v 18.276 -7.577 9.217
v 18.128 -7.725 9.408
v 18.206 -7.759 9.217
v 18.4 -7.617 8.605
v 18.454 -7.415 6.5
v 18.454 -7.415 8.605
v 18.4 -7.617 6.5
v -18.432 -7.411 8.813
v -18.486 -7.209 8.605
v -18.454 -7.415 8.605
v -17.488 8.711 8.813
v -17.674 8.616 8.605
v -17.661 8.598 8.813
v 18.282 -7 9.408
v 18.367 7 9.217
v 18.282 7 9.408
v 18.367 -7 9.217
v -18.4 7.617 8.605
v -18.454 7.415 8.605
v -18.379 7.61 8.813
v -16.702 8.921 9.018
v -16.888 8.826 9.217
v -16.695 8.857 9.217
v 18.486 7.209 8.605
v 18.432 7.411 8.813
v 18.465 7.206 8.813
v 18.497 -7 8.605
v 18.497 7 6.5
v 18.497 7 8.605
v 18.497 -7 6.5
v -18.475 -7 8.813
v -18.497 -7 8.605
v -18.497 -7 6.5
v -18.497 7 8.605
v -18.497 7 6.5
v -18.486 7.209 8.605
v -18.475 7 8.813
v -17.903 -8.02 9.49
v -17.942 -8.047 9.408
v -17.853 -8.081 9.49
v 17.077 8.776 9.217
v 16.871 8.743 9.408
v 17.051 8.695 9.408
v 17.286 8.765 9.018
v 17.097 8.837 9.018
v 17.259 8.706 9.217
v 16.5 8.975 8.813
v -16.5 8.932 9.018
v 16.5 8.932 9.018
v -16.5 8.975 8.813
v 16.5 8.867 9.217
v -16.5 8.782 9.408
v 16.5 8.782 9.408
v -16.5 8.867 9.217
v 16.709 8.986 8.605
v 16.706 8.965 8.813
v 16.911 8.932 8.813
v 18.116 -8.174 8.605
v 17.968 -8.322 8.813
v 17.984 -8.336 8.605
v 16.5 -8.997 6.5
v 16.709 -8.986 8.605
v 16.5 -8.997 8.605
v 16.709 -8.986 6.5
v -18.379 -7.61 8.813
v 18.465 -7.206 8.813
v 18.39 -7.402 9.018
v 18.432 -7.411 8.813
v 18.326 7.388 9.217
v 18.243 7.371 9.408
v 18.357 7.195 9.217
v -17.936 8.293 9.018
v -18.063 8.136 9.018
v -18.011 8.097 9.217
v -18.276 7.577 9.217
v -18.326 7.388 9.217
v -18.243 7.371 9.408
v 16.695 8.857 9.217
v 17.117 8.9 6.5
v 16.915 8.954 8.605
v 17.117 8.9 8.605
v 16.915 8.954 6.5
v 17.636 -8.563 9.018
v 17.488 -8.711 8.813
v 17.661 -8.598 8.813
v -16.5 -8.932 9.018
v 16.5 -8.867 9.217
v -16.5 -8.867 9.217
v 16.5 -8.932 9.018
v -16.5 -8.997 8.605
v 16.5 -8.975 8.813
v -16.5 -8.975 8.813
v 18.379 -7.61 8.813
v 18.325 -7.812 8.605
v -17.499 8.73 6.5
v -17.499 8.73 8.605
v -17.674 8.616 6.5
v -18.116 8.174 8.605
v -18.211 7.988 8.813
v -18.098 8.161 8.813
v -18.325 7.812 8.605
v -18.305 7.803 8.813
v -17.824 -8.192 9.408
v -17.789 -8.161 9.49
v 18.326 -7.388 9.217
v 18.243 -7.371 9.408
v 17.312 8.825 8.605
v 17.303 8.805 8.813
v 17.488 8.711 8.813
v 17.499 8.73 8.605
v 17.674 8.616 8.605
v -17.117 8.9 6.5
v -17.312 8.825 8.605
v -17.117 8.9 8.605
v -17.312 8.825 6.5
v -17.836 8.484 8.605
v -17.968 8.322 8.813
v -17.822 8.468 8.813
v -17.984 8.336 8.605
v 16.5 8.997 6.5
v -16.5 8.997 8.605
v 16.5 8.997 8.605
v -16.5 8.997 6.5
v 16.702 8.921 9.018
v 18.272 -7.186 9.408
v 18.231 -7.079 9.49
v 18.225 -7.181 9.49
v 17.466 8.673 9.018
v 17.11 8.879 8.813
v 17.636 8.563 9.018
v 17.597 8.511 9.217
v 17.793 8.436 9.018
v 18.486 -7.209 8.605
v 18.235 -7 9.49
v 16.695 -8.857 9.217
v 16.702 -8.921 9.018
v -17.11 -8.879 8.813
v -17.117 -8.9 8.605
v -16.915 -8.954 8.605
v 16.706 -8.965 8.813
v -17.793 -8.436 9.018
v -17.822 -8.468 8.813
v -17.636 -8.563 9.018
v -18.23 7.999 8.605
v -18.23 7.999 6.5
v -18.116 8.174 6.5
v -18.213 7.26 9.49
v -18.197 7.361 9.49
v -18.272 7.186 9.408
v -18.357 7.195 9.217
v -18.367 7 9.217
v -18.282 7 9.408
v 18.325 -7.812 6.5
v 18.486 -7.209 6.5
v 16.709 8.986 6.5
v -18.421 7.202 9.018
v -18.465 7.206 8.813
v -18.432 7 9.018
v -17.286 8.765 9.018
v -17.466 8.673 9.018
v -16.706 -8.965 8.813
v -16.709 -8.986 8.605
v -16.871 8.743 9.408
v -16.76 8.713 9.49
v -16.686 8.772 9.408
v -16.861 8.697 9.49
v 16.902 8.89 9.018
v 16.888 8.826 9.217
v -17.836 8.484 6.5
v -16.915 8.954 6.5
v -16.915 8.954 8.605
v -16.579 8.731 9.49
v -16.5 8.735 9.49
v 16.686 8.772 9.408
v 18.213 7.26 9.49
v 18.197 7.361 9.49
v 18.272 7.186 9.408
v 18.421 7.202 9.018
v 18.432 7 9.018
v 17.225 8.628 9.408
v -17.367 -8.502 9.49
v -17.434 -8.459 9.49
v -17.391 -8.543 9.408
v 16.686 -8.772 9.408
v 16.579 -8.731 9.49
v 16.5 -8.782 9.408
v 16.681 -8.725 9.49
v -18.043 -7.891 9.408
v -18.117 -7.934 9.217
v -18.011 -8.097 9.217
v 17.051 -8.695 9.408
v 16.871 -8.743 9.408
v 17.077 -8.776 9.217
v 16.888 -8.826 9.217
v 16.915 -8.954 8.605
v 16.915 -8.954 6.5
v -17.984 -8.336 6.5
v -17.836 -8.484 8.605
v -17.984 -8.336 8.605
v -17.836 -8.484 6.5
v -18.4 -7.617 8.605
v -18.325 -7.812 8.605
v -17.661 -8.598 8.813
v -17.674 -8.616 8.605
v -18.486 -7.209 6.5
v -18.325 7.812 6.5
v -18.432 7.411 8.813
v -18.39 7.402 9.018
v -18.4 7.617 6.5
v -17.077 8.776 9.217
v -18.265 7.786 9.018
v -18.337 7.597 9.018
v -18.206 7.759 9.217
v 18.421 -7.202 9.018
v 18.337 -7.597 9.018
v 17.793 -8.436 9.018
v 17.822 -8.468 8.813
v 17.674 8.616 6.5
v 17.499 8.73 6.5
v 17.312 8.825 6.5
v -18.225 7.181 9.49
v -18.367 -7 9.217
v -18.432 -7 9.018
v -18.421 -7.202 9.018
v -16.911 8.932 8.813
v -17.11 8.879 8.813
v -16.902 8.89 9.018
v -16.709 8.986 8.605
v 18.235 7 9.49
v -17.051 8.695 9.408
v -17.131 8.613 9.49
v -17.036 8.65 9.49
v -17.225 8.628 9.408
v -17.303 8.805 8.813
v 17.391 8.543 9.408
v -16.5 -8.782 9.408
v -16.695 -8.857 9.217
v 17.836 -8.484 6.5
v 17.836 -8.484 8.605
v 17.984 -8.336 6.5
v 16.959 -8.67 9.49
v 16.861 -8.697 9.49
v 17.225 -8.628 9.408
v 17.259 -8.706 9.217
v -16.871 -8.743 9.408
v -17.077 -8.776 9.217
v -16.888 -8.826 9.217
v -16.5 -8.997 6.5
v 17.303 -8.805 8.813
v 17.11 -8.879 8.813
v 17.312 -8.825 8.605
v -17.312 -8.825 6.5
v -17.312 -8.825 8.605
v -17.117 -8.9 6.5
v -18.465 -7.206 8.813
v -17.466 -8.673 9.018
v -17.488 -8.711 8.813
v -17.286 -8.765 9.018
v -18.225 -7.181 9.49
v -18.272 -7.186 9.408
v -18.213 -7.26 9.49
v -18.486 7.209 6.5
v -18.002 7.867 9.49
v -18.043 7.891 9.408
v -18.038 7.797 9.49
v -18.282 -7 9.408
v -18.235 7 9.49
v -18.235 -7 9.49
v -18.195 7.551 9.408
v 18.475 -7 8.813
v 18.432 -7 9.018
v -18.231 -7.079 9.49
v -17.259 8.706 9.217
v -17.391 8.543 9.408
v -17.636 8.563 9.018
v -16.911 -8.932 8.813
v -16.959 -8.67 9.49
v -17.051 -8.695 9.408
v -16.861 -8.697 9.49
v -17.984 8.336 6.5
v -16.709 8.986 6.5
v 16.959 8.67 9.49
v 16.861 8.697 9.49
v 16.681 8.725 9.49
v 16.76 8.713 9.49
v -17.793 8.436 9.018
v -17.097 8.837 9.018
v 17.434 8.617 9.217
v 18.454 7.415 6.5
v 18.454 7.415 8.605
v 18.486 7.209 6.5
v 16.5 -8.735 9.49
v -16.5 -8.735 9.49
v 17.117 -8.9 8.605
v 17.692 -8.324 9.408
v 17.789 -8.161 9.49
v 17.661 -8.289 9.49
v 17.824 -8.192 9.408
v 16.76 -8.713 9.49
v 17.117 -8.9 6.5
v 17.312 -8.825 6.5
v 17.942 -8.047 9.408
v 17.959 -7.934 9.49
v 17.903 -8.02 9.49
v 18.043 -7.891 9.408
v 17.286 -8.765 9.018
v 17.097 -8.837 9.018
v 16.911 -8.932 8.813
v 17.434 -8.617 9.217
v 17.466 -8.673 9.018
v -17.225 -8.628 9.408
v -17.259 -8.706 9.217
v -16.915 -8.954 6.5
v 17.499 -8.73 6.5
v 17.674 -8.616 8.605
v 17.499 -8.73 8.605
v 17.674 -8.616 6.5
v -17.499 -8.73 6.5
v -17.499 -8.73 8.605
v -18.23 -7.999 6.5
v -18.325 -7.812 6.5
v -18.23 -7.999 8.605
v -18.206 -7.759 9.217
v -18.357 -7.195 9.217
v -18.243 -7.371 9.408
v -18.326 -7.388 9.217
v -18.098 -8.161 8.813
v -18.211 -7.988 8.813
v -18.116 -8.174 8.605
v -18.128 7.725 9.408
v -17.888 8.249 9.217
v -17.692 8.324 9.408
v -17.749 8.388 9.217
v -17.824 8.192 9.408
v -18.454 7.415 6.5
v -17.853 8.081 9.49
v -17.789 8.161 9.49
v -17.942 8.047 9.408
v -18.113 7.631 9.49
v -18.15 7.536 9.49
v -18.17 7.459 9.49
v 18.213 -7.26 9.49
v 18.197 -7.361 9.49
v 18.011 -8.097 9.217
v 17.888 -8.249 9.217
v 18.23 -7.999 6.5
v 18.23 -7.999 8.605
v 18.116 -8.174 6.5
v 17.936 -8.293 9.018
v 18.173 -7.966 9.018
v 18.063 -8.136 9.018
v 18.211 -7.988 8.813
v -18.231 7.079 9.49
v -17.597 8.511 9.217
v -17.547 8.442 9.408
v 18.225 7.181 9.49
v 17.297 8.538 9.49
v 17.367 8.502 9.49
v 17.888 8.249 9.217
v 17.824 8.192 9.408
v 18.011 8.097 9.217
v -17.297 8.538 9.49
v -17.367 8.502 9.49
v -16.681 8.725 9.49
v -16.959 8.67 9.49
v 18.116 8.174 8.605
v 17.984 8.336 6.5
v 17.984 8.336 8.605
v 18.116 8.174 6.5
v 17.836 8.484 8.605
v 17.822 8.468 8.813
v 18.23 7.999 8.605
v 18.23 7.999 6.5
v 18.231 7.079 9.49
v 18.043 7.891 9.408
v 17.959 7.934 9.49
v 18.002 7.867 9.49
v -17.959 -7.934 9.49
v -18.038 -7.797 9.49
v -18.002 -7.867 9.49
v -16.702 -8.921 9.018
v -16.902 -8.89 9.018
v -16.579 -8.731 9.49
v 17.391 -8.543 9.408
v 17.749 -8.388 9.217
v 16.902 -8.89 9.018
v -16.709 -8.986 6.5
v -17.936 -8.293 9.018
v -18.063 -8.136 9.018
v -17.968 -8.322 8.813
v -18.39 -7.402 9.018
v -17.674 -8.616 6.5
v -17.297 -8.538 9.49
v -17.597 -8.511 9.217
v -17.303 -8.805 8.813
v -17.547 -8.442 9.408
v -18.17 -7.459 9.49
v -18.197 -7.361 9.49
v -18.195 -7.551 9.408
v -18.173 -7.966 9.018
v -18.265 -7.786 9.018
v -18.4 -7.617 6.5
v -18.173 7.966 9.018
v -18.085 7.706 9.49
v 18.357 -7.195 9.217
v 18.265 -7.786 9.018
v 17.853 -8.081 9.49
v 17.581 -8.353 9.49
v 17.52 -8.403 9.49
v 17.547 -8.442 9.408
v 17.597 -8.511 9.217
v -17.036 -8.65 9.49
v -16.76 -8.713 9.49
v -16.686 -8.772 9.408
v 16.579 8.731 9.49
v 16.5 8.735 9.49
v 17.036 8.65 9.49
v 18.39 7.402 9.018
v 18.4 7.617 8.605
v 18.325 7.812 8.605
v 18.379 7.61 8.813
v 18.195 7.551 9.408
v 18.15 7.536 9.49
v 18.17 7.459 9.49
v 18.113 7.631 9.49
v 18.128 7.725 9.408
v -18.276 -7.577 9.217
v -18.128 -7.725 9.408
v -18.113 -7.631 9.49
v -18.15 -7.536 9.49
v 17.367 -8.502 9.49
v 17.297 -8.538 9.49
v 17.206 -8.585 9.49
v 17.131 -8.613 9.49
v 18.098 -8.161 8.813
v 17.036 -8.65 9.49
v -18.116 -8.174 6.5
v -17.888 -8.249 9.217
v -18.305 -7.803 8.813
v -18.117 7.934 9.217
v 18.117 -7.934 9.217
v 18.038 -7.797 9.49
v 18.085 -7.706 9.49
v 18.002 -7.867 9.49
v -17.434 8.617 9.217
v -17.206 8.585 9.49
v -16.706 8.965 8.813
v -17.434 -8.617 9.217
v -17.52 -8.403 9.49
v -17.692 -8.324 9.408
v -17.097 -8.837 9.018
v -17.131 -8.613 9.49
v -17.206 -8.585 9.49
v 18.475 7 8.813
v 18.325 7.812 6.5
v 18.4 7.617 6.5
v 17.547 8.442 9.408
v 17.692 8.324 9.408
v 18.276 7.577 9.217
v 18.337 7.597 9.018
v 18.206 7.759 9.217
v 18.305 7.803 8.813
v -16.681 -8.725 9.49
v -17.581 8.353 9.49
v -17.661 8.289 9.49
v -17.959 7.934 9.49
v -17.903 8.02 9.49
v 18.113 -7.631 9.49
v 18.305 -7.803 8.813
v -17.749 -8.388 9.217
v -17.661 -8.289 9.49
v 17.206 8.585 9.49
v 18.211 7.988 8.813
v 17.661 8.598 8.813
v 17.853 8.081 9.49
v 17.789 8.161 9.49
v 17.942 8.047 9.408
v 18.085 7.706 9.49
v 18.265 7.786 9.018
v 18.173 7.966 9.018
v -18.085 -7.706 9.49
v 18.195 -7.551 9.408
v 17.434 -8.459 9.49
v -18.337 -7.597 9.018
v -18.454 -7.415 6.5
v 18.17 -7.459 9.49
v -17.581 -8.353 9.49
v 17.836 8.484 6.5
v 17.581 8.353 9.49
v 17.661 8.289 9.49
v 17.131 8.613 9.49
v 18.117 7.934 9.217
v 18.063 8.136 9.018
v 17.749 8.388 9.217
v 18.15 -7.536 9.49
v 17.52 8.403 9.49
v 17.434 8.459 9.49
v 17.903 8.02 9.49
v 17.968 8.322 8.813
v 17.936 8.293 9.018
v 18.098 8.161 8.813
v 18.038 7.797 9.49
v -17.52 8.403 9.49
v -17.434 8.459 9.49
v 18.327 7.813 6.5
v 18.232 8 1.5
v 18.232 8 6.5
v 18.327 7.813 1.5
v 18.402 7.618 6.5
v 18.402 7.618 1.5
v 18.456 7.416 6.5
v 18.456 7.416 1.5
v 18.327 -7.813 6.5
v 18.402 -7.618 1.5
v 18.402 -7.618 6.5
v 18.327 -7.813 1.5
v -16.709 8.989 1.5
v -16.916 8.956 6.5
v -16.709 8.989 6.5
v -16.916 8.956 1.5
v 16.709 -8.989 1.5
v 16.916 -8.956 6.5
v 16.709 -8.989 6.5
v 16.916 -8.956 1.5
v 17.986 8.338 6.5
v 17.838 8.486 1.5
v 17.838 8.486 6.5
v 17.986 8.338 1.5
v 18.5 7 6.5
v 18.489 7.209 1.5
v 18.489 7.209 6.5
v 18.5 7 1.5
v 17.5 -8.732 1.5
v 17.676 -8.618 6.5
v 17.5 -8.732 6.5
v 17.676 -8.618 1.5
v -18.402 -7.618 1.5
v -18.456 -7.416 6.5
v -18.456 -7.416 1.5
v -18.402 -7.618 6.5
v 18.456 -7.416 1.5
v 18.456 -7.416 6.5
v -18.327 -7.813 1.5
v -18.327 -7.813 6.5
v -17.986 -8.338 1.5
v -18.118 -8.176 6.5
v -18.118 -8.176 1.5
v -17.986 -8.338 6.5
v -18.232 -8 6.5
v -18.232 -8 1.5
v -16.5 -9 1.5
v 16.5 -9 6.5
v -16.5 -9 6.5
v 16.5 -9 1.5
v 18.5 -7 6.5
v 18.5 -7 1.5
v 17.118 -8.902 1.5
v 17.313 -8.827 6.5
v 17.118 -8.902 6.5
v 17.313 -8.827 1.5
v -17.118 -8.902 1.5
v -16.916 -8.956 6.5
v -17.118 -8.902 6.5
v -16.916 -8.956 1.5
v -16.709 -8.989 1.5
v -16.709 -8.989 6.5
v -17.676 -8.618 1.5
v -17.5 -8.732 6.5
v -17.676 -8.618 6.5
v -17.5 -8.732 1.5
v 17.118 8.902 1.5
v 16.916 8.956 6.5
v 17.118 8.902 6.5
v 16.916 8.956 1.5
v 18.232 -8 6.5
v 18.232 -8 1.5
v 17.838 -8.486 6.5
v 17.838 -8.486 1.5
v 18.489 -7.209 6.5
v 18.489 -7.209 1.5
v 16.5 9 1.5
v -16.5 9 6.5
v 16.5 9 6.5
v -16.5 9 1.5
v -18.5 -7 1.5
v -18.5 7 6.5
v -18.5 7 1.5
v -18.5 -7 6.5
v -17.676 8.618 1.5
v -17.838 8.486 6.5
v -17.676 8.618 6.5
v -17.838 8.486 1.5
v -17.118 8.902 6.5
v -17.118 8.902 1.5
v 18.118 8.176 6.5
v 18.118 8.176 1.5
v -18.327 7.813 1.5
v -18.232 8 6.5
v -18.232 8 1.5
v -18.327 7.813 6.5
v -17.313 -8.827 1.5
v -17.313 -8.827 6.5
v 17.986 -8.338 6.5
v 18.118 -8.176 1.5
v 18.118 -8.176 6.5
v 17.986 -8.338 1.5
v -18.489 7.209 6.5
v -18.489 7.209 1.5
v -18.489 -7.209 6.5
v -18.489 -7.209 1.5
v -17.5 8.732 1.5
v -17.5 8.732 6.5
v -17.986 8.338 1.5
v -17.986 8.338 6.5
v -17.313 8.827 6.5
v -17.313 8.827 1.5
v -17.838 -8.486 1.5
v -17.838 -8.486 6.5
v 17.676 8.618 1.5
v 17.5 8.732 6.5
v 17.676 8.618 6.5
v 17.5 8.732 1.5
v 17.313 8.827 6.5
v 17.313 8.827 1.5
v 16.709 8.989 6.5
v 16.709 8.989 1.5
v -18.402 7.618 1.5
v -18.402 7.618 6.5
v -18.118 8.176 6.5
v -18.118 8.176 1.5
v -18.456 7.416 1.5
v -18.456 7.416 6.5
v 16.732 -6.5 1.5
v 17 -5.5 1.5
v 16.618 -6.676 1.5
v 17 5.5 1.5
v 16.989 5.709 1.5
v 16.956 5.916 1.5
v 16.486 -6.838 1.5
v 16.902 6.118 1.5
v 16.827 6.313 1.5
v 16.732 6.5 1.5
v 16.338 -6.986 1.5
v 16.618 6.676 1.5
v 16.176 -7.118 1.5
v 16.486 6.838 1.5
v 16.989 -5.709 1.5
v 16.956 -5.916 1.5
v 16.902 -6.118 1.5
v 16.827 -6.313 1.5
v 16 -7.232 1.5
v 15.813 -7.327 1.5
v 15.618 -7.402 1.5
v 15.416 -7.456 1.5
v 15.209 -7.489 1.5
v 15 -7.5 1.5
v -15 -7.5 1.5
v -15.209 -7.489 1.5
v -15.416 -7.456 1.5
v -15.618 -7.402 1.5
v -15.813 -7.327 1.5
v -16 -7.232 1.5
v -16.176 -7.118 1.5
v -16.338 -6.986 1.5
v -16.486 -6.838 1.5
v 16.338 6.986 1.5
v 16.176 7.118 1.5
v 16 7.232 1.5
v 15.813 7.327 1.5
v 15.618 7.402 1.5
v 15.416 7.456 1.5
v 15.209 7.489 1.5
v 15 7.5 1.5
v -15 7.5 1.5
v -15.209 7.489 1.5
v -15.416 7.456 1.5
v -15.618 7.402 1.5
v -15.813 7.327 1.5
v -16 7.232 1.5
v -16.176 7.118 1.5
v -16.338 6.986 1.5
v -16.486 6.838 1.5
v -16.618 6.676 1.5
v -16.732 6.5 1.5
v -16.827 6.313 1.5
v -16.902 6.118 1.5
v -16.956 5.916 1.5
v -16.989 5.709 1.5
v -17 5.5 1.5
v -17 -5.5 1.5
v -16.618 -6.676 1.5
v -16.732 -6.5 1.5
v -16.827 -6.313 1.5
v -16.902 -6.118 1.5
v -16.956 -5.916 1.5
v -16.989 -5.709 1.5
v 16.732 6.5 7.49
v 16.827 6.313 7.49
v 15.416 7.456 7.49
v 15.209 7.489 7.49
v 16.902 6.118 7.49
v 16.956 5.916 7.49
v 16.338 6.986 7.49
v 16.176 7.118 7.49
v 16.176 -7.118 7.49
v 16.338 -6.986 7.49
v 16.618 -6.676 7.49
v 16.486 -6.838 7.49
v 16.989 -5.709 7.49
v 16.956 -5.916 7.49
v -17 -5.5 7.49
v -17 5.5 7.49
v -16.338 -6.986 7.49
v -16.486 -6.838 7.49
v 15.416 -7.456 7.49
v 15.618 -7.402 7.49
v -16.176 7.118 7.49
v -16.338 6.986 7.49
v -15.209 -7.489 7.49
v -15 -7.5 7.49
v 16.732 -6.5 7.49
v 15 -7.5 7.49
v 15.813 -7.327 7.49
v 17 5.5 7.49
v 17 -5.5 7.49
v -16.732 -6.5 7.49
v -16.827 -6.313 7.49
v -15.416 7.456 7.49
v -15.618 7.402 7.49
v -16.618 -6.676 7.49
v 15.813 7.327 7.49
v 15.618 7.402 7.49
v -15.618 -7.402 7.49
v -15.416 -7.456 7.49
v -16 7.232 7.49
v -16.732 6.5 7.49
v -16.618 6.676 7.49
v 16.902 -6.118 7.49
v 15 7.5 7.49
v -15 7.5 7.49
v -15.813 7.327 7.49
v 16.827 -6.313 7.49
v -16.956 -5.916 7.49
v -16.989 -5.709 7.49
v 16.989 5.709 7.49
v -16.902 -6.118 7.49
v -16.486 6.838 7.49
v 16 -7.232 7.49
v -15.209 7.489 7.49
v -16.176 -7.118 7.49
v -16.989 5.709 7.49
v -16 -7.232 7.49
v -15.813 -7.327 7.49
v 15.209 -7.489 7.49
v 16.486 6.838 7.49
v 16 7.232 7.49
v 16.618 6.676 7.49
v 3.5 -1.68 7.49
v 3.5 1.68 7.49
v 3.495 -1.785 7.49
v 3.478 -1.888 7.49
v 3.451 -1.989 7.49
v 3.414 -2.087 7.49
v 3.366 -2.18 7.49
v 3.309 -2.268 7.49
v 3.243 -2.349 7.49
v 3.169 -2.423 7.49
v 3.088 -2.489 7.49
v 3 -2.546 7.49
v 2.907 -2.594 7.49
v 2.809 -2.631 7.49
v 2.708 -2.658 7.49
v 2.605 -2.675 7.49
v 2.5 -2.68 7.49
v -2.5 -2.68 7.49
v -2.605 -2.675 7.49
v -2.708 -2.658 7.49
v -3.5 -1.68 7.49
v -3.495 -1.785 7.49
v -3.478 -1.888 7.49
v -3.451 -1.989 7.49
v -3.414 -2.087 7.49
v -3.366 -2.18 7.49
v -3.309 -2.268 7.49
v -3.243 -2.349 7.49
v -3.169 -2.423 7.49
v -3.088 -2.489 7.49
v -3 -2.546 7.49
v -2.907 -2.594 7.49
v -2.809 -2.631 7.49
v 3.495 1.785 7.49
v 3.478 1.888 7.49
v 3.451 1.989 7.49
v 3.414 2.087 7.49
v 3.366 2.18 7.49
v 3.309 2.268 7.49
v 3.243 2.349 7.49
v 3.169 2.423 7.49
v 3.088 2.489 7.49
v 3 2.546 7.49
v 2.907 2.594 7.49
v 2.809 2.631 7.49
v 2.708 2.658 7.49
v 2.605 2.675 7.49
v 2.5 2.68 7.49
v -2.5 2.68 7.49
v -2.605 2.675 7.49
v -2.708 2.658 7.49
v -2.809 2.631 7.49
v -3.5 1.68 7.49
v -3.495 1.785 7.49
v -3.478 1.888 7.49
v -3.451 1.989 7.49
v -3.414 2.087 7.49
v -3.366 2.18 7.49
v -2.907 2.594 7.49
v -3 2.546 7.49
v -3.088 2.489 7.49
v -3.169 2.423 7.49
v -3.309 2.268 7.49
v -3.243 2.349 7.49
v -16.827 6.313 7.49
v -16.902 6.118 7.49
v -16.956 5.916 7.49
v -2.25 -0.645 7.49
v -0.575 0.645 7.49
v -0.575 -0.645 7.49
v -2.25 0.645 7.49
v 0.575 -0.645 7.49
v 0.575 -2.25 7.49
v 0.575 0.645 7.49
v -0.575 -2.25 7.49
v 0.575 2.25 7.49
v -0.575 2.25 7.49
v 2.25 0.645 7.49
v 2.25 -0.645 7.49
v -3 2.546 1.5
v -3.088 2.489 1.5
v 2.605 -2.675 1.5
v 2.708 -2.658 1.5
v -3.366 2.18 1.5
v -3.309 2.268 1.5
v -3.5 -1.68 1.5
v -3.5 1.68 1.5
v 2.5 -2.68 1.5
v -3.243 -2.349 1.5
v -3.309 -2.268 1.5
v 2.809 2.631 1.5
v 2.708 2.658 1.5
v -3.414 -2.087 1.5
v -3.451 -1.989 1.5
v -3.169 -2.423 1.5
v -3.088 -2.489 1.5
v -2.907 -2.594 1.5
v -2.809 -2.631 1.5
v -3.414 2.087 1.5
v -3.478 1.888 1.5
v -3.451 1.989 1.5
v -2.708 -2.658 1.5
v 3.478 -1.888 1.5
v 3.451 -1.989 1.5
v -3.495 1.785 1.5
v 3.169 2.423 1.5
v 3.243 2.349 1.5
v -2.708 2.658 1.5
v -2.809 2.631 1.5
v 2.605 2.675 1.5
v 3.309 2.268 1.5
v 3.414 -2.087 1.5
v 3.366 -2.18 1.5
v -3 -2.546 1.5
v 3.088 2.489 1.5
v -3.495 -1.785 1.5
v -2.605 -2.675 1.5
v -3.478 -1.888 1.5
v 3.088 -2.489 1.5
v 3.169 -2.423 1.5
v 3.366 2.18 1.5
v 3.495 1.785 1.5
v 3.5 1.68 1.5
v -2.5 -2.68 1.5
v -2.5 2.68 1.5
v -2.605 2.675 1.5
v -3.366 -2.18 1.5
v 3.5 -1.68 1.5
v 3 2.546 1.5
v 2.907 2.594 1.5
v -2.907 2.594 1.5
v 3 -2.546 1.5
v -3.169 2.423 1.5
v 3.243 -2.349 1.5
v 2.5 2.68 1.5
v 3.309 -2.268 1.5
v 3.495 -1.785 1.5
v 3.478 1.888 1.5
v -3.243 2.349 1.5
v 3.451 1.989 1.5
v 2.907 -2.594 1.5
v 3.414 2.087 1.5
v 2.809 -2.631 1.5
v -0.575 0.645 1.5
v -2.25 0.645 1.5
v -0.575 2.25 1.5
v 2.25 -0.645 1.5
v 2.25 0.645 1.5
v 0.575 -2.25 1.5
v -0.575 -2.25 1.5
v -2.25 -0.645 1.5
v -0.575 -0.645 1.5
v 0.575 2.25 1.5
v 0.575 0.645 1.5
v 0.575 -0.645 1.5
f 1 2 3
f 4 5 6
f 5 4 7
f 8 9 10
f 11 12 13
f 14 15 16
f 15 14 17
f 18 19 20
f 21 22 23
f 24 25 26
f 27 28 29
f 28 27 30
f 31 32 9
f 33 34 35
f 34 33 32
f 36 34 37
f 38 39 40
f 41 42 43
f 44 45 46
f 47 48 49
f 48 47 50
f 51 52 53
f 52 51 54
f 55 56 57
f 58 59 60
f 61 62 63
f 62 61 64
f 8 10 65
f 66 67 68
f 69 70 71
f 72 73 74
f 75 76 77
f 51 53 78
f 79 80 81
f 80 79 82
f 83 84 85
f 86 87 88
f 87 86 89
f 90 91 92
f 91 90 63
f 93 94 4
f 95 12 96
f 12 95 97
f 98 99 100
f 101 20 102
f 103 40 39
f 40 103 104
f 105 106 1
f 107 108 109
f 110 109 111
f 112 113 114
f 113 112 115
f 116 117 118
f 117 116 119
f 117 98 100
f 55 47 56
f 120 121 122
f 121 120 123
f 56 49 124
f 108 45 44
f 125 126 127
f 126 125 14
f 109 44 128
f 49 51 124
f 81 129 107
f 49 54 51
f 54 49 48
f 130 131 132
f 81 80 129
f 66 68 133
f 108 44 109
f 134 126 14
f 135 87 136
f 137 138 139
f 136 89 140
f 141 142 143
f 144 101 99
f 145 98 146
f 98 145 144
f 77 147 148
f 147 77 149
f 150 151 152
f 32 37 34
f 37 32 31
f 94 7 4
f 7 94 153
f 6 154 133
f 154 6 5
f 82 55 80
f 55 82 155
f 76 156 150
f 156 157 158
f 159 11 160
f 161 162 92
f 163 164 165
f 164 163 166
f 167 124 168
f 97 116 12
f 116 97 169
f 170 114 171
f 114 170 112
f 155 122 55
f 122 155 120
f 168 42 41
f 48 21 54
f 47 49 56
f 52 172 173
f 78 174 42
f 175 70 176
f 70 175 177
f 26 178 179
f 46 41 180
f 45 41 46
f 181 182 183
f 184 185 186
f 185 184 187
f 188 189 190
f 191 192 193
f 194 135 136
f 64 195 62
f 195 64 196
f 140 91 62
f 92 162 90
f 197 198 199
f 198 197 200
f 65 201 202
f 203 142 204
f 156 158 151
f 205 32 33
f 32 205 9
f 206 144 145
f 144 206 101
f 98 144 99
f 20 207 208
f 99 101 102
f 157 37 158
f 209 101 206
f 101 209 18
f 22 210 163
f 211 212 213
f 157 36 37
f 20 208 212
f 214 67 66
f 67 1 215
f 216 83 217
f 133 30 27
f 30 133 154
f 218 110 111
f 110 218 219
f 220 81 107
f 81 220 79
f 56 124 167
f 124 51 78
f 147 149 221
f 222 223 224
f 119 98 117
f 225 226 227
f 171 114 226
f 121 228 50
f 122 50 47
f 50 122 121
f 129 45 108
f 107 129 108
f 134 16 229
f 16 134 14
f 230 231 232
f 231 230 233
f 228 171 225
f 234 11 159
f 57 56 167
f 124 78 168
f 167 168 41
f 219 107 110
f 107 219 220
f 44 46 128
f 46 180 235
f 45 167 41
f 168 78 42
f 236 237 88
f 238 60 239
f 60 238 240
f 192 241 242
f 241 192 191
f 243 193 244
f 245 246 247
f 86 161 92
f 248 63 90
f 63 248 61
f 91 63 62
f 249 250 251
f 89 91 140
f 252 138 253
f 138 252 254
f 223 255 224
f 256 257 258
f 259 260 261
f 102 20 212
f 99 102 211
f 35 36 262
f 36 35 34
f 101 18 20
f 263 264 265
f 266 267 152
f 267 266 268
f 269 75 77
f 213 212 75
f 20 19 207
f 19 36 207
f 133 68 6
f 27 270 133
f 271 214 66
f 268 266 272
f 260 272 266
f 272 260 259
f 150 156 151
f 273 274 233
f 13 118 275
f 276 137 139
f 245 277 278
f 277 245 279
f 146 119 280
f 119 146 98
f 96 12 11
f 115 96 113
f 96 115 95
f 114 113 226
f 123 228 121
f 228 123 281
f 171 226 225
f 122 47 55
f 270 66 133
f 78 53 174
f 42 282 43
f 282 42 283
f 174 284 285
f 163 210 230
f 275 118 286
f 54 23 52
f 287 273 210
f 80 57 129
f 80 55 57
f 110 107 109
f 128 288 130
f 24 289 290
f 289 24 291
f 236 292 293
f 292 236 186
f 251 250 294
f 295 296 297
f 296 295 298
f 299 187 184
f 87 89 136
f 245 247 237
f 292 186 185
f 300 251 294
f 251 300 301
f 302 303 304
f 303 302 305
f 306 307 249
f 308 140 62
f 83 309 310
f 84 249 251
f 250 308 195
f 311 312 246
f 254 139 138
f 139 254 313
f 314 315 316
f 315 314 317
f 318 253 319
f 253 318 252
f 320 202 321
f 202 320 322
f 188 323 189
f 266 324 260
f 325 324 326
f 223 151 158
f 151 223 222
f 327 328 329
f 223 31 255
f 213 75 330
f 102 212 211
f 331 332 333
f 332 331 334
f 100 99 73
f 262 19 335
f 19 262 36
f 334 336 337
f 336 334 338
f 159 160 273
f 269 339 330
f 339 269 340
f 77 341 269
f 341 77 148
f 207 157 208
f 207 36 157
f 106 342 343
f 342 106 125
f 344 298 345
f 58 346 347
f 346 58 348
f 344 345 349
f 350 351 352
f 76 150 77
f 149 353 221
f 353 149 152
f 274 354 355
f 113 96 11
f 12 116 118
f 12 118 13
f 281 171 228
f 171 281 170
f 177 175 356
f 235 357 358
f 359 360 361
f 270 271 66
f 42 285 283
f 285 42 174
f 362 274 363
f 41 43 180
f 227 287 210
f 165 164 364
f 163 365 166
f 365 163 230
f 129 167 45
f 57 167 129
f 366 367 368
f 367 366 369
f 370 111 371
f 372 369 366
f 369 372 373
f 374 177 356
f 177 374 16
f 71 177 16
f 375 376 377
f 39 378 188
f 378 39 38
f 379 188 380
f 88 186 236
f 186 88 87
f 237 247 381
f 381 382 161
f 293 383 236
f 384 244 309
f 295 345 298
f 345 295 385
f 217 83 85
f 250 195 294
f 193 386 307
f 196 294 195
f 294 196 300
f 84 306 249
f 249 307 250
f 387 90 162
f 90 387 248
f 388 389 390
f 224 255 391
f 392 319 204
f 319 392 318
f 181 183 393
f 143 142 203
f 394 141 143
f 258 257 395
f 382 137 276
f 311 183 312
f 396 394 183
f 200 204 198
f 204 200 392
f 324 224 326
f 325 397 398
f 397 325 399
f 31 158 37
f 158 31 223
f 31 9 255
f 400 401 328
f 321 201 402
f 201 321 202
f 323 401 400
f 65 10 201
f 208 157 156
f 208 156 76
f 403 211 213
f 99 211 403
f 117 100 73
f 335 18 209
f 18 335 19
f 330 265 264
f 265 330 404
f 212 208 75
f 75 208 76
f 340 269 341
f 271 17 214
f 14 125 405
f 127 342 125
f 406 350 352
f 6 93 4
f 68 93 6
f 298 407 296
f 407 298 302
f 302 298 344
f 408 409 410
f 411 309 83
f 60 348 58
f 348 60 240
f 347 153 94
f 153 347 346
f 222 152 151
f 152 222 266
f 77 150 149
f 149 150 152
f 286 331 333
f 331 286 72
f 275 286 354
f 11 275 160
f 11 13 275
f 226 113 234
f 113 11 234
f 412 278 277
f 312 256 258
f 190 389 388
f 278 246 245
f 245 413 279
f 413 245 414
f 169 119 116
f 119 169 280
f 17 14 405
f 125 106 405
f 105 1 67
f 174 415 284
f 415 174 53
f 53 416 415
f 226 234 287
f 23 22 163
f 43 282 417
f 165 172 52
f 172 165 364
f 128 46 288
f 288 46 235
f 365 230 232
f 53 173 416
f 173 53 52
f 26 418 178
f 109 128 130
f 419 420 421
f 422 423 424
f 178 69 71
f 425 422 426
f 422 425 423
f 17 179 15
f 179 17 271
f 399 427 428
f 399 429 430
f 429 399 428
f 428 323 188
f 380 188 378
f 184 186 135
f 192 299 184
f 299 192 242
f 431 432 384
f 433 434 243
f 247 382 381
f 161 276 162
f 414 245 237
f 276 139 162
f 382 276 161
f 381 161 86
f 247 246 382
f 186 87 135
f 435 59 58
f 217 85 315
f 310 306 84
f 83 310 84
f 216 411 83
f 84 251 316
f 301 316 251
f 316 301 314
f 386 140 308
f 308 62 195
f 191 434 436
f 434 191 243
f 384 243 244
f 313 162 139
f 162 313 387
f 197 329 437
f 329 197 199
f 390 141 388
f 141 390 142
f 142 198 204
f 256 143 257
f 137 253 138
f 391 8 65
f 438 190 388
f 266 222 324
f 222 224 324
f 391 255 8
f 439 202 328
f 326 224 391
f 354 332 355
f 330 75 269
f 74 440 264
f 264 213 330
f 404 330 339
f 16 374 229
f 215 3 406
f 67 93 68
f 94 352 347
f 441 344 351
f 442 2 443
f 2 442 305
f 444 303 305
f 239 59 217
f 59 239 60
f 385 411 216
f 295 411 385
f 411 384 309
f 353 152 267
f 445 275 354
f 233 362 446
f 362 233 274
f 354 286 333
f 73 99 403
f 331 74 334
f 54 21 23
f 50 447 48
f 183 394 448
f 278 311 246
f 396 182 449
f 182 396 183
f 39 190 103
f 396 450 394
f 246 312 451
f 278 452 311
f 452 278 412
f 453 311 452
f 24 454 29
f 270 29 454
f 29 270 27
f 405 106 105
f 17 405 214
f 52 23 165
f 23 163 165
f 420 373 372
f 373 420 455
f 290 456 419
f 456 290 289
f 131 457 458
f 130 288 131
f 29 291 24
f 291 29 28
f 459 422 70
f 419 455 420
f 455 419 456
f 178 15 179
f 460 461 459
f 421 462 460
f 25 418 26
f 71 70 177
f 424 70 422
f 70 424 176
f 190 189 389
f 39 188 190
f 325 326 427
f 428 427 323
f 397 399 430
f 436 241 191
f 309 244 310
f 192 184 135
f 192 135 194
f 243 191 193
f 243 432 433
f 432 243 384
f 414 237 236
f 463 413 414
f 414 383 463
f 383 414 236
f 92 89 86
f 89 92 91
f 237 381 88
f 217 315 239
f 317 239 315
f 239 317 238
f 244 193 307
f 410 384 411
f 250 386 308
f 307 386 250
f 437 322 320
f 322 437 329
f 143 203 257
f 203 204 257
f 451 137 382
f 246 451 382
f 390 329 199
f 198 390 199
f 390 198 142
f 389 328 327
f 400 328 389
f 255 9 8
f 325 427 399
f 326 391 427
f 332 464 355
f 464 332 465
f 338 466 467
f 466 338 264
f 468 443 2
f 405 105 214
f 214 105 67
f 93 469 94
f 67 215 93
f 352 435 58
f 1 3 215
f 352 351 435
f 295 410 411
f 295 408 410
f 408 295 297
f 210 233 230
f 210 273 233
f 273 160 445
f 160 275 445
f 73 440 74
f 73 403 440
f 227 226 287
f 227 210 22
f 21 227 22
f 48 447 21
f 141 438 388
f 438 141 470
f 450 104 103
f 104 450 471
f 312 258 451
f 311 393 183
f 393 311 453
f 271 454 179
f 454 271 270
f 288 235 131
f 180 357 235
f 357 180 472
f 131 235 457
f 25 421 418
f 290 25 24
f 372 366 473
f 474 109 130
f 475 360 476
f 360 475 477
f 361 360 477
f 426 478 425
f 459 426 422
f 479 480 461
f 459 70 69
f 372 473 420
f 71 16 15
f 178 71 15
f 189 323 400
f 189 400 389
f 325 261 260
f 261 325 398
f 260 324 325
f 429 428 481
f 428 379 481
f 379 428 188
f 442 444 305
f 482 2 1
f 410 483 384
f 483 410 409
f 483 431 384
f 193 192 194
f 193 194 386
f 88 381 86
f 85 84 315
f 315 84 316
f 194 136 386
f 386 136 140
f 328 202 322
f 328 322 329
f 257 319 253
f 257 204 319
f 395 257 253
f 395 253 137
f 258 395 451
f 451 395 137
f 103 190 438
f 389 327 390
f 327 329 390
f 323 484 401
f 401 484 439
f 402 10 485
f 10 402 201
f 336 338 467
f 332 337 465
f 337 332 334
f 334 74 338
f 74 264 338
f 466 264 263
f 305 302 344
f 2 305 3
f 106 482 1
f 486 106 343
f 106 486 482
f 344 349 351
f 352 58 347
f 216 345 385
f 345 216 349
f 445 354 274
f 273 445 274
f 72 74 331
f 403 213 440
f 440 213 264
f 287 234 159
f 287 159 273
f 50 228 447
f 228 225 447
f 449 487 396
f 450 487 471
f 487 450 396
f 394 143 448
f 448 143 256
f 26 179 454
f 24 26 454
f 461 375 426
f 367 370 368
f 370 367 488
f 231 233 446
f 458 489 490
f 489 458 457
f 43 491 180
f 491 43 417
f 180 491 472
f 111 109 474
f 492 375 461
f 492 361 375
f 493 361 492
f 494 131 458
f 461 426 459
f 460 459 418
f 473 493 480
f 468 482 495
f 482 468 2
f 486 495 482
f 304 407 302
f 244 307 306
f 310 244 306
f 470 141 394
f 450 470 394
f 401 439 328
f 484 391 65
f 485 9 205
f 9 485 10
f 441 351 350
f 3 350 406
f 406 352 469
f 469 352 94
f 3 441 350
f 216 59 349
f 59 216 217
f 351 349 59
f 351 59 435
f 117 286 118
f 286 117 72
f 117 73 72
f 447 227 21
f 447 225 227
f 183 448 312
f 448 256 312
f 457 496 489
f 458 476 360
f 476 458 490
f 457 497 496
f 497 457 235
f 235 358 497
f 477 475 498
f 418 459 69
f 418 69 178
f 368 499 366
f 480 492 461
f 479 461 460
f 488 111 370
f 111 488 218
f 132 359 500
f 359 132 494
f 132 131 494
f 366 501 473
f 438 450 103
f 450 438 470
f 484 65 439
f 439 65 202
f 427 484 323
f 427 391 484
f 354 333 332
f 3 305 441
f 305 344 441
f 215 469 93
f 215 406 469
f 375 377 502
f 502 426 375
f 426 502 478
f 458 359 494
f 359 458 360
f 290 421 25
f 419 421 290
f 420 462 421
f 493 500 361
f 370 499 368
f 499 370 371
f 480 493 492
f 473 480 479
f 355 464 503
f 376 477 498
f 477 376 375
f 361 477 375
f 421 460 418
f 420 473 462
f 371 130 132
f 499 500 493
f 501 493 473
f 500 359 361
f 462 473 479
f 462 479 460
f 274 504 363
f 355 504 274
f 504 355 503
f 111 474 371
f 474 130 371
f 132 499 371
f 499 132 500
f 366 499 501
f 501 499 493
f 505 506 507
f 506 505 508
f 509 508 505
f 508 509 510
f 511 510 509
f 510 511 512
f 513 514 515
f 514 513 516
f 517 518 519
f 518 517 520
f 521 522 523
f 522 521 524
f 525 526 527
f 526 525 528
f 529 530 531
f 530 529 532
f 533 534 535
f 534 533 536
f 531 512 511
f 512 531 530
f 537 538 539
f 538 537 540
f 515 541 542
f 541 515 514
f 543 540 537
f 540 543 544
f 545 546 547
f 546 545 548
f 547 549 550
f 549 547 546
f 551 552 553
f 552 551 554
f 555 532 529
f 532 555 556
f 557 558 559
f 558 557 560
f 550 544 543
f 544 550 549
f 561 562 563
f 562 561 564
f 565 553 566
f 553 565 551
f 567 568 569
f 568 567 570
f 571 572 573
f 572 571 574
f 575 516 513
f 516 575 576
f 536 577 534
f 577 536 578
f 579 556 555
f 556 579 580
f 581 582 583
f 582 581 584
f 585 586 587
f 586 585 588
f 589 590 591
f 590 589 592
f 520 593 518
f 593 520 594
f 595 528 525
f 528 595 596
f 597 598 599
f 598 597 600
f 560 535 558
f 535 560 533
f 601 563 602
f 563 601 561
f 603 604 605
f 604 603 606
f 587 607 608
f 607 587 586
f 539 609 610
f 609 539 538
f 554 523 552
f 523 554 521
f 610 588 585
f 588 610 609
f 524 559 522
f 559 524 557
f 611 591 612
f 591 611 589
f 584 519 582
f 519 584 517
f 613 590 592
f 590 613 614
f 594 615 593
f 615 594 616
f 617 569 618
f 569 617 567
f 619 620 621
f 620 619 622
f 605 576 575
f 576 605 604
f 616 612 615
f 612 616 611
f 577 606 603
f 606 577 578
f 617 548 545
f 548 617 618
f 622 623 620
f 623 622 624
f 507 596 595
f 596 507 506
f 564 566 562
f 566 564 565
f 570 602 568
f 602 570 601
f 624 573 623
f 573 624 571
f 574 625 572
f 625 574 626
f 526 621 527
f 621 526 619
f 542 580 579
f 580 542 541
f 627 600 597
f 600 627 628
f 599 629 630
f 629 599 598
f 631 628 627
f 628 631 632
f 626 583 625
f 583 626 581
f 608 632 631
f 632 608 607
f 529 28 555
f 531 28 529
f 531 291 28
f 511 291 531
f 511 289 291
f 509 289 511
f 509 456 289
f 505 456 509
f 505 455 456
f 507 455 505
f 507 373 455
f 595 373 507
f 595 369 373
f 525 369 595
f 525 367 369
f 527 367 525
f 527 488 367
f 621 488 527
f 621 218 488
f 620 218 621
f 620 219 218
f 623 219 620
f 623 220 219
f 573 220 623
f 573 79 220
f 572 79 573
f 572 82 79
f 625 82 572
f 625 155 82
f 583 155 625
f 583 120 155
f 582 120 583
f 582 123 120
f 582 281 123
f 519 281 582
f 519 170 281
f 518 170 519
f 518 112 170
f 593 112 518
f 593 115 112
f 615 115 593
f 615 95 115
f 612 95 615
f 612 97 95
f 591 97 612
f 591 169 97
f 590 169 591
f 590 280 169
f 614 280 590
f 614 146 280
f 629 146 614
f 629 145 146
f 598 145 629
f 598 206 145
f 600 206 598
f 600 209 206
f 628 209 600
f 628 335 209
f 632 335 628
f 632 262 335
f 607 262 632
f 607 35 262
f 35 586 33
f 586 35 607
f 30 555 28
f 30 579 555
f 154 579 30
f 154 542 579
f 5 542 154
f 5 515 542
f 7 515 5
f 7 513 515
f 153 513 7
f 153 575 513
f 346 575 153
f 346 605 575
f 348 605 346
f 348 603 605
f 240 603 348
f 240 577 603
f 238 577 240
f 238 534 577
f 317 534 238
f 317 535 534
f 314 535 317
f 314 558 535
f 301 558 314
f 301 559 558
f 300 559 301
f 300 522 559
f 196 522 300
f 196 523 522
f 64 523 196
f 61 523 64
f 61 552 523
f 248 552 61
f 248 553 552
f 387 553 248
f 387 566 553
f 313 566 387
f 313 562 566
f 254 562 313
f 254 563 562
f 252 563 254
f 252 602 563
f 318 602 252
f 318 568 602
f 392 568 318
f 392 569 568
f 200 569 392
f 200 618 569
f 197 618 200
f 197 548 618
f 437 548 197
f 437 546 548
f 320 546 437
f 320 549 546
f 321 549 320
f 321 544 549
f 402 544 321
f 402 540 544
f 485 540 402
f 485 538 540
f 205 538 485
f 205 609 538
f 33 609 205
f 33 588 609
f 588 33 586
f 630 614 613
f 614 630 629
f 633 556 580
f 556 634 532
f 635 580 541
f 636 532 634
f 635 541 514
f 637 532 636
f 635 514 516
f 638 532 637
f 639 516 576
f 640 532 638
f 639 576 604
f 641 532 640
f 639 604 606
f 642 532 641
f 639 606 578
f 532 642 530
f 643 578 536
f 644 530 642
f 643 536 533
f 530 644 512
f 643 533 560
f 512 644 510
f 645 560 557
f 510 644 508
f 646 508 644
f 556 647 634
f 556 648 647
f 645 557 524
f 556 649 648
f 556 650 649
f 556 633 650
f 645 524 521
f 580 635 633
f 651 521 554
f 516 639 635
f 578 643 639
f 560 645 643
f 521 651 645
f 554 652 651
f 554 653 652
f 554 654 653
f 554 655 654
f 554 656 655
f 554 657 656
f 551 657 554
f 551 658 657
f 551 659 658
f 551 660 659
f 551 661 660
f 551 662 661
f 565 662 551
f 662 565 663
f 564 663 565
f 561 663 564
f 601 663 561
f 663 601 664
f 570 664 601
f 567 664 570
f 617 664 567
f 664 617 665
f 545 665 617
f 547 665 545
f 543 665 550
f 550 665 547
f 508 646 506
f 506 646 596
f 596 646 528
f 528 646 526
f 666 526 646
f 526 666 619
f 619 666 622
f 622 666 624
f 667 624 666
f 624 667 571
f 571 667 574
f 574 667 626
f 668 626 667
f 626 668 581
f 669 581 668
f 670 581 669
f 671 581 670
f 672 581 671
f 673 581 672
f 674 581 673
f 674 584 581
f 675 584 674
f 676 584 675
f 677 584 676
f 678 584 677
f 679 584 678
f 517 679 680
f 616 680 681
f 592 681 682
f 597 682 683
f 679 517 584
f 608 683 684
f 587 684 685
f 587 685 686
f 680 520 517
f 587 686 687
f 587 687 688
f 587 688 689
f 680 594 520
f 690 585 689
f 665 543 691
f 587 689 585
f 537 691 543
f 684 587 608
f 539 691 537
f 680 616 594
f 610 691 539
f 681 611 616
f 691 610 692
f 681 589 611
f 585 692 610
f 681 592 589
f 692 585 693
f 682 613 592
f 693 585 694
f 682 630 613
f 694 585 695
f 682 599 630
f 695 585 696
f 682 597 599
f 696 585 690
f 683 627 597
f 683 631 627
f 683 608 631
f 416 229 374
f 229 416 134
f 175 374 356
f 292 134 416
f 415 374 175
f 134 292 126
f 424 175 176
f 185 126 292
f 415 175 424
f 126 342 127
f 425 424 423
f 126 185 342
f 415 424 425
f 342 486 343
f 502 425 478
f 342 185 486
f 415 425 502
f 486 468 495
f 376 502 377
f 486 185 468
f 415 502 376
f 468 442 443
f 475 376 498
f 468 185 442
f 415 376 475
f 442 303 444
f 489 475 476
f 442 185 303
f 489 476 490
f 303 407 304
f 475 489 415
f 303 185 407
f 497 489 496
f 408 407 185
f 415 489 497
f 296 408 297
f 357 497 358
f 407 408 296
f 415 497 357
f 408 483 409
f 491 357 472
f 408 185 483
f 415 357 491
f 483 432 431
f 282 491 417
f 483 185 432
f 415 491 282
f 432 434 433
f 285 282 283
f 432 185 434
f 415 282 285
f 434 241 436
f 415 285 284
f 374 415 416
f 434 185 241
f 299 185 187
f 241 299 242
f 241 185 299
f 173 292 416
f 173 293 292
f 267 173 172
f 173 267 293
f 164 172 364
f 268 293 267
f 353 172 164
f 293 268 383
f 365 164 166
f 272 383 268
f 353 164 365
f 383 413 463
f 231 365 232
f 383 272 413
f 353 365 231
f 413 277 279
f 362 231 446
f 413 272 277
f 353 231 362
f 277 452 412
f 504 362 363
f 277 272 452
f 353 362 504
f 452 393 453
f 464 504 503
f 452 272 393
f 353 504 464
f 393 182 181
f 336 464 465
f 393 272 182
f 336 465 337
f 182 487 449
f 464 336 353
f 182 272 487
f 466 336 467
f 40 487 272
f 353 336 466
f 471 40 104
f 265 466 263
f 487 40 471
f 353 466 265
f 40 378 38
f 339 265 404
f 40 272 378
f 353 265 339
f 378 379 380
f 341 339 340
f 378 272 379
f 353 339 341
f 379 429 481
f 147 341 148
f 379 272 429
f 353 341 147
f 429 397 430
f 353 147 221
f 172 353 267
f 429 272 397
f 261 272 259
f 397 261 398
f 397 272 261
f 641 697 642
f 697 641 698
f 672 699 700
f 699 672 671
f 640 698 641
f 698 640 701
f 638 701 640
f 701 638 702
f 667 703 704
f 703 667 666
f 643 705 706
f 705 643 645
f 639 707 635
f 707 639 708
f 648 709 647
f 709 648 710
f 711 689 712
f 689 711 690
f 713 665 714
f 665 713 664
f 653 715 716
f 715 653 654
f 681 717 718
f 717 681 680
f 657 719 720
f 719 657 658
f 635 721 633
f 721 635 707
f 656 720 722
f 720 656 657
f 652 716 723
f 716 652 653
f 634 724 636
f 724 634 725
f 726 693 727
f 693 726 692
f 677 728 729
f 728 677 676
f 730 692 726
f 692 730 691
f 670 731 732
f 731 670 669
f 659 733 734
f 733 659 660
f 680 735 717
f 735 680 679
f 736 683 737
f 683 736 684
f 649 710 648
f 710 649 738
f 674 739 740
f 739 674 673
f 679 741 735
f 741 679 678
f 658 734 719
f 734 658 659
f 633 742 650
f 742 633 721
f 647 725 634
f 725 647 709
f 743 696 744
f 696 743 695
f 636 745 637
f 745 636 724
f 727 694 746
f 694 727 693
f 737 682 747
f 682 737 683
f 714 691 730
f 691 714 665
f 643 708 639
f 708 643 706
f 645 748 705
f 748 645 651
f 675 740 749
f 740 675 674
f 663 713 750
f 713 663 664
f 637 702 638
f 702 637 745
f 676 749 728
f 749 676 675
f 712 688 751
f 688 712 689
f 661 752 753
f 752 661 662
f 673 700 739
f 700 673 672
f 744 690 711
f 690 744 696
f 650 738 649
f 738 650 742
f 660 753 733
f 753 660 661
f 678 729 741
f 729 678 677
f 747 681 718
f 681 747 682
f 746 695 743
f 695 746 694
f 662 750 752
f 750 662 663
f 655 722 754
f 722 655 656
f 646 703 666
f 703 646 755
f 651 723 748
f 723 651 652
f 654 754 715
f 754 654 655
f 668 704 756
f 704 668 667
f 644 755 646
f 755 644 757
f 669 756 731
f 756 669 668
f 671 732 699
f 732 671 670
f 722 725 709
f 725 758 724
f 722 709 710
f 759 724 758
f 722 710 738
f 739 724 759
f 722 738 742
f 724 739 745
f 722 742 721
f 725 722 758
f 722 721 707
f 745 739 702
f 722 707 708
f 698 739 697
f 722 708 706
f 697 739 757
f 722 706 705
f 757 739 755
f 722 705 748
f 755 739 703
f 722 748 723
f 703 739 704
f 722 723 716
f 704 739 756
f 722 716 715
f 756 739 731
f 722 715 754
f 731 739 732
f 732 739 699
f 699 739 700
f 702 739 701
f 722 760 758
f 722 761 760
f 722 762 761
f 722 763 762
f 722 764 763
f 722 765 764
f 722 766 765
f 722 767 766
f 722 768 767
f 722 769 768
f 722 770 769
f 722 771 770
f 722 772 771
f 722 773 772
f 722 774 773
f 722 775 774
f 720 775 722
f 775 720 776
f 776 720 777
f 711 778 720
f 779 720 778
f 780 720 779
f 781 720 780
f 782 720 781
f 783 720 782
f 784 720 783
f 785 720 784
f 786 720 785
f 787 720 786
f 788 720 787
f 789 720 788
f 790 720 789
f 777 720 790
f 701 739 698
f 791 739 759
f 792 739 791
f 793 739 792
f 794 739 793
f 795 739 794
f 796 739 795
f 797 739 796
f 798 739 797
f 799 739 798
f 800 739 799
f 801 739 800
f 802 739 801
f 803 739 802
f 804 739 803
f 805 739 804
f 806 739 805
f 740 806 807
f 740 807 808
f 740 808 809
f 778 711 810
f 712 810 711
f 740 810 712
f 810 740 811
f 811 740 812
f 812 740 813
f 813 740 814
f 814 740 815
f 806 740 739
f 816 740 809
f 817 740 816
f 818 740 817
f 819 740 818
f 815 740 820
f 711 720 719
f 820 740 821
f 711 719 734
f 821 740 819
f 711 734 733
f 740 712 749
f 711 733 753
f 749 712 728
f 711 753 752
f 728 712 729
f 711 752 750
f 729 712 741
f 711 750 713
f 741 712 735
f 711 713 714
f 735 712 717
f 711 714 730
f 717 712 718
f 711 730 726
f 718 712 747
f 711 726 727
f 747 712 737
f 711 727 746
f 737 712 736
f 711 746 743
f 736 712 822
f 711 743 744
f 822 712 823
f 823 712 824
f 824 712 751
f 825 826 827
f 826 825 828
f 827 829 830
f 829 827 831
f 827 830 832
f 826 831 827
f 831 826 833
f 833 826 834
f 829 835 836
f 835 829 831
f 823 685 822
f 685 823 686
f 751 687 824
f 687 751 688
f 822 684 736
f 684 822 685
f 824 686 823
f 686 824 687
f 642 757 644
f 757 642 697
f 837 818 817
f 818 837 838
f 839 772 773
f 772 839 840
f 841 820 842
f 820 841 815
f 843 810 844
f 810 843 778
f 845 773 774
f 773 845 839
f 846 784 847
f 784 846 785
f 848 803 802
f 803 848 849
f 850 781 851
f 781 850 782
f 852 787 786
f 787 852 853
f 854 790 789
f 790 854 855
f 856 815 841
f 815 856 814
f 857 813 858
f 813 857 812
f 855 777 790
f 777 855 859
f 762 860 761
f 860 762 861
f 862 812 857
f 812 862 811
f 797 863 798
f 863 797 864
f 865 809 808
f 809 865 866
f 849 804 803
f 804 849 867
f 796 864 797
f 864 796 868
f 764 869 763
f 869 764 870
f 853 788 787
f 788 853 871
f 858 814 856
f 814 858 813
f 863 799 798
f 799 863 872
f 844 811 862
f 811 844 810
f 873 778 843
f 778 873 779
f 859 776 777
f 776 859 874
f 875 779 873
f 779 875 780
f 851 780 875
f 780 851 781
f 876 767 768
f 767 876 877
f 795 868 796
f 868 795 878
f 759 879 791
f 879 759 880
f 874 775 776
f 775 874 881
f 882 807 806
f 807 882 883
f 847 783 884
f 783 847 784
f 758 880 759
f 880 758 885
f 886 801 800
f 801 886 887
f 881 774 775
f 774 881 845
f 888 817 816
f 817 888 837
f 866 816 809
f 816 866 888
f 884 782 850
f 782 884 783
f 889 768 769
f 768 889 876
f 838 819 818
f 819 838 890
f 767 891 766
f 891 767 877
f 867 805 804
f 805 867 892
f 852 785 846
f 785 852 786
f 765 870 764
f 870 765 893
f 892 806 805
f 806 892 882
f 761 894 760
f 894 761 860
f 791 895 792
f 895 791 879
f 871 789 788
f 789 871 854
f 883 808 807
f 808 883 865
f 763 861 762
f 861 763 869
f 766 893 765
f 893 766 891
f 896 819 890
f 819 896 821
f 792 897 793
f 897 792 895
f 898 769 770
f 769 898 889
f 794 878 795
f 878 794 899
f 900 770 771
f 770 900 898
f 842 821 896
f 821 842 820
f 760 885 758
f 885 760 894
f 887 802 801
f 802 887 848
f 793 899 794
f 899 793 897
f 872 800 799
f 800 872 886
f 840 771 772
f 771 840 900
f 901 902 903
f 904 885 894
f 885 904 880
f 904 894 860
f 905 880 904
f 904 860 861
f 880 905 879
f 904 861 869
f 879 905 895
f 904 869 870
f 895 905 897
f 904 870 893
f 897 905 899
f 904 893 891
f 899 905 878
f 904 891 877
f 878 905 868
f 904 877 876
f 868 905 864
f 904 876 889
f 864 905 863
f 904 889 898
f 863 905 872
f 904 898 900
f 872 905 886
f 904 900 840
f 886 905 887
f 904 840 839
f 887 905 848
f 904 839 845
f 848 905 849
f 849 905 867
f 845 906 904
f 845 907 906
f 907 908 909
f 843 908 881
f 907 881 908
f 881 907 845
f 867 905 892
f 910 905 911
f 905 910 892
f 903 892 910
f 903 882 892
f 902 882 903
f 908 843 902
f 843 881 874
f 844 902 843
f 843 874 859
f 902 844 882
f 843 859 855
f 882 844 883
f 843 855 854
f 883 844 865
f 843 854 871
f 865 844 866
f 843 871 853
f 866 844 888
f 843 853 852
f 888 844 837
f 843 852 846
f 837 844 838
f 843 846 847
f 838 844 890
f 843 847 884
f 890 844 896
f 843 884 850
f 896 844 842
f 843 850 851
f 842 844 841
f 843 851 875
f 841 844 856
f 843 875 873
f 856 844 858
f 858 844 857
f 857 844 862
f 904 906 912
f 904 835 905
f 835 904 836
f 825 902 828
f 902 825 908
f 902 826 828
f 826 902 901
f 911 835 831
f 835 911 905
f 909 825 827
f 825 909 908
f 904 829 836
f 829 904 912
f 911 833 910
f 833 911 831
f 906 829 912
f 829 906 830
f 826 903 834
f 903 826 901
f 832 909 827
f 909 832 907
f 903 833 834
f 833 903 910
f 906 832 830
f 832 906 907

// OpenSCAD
// Define higher resolution for transformations
$fn=60;

difference() {
union(){
    // keycap outside cupola
    difference() {
        union() {
            // Top bezel is 2mm but should be 1mm, let's see how it prints first
            // rounded cap - top half
            translate([0,0,7.5]) // half mil under ten
            minkowski() {
                cube([37-2*2, 18-2*2, 6-2*2], true);
                sphere(2);
            };

            // rounded sides - bottom half
            translate([0,0,1.5])
            linear_extrude(height=5)
            minkowski() {
                square([37-2*2, 18-2*2], true);
                circle(2);
            };
        };

        // top flattening
        translate([0,0,9.49])
        sideroundedcube(38, 6, 2);

        // internal cupola cutoff
        translate([0,0,1.49])
        linear_extrude(height=6)
        minkowski() {
            square([34-2*2, 15-2*2], true);
            circle(2);
        };
    }

    // fitting support
    translate([0, 0, 4.75])
    difference(){
        // housing fitting
        hull() {
            translate([2.50, 1.68, 0])   cylinder(6.5, 1, 1, true);
            translate([-2.50, 1.68, 0])  cylinder(6.5, 1, 1, true);
            translate([2.50, -1.68, 0])  cylinder(6.5, 1, 1, true);
            translate([-2.50, -1.68, 0]) cylinder(6.5, 1, 1, true);
        }
        // cross fitting cutoff
        cube([4.5, 1.29, 10], true);
        cube([1.15, 4.5, 10], true);
    }
}
*translate([0, 10, 0]) cube([40, 20, 20], true);
}


module sideroundedcube(s, h, r) {
    linear_extrude(height=h)
    minkowski() {
        square(s-r*2, true);
        circle(r);
    };
}
